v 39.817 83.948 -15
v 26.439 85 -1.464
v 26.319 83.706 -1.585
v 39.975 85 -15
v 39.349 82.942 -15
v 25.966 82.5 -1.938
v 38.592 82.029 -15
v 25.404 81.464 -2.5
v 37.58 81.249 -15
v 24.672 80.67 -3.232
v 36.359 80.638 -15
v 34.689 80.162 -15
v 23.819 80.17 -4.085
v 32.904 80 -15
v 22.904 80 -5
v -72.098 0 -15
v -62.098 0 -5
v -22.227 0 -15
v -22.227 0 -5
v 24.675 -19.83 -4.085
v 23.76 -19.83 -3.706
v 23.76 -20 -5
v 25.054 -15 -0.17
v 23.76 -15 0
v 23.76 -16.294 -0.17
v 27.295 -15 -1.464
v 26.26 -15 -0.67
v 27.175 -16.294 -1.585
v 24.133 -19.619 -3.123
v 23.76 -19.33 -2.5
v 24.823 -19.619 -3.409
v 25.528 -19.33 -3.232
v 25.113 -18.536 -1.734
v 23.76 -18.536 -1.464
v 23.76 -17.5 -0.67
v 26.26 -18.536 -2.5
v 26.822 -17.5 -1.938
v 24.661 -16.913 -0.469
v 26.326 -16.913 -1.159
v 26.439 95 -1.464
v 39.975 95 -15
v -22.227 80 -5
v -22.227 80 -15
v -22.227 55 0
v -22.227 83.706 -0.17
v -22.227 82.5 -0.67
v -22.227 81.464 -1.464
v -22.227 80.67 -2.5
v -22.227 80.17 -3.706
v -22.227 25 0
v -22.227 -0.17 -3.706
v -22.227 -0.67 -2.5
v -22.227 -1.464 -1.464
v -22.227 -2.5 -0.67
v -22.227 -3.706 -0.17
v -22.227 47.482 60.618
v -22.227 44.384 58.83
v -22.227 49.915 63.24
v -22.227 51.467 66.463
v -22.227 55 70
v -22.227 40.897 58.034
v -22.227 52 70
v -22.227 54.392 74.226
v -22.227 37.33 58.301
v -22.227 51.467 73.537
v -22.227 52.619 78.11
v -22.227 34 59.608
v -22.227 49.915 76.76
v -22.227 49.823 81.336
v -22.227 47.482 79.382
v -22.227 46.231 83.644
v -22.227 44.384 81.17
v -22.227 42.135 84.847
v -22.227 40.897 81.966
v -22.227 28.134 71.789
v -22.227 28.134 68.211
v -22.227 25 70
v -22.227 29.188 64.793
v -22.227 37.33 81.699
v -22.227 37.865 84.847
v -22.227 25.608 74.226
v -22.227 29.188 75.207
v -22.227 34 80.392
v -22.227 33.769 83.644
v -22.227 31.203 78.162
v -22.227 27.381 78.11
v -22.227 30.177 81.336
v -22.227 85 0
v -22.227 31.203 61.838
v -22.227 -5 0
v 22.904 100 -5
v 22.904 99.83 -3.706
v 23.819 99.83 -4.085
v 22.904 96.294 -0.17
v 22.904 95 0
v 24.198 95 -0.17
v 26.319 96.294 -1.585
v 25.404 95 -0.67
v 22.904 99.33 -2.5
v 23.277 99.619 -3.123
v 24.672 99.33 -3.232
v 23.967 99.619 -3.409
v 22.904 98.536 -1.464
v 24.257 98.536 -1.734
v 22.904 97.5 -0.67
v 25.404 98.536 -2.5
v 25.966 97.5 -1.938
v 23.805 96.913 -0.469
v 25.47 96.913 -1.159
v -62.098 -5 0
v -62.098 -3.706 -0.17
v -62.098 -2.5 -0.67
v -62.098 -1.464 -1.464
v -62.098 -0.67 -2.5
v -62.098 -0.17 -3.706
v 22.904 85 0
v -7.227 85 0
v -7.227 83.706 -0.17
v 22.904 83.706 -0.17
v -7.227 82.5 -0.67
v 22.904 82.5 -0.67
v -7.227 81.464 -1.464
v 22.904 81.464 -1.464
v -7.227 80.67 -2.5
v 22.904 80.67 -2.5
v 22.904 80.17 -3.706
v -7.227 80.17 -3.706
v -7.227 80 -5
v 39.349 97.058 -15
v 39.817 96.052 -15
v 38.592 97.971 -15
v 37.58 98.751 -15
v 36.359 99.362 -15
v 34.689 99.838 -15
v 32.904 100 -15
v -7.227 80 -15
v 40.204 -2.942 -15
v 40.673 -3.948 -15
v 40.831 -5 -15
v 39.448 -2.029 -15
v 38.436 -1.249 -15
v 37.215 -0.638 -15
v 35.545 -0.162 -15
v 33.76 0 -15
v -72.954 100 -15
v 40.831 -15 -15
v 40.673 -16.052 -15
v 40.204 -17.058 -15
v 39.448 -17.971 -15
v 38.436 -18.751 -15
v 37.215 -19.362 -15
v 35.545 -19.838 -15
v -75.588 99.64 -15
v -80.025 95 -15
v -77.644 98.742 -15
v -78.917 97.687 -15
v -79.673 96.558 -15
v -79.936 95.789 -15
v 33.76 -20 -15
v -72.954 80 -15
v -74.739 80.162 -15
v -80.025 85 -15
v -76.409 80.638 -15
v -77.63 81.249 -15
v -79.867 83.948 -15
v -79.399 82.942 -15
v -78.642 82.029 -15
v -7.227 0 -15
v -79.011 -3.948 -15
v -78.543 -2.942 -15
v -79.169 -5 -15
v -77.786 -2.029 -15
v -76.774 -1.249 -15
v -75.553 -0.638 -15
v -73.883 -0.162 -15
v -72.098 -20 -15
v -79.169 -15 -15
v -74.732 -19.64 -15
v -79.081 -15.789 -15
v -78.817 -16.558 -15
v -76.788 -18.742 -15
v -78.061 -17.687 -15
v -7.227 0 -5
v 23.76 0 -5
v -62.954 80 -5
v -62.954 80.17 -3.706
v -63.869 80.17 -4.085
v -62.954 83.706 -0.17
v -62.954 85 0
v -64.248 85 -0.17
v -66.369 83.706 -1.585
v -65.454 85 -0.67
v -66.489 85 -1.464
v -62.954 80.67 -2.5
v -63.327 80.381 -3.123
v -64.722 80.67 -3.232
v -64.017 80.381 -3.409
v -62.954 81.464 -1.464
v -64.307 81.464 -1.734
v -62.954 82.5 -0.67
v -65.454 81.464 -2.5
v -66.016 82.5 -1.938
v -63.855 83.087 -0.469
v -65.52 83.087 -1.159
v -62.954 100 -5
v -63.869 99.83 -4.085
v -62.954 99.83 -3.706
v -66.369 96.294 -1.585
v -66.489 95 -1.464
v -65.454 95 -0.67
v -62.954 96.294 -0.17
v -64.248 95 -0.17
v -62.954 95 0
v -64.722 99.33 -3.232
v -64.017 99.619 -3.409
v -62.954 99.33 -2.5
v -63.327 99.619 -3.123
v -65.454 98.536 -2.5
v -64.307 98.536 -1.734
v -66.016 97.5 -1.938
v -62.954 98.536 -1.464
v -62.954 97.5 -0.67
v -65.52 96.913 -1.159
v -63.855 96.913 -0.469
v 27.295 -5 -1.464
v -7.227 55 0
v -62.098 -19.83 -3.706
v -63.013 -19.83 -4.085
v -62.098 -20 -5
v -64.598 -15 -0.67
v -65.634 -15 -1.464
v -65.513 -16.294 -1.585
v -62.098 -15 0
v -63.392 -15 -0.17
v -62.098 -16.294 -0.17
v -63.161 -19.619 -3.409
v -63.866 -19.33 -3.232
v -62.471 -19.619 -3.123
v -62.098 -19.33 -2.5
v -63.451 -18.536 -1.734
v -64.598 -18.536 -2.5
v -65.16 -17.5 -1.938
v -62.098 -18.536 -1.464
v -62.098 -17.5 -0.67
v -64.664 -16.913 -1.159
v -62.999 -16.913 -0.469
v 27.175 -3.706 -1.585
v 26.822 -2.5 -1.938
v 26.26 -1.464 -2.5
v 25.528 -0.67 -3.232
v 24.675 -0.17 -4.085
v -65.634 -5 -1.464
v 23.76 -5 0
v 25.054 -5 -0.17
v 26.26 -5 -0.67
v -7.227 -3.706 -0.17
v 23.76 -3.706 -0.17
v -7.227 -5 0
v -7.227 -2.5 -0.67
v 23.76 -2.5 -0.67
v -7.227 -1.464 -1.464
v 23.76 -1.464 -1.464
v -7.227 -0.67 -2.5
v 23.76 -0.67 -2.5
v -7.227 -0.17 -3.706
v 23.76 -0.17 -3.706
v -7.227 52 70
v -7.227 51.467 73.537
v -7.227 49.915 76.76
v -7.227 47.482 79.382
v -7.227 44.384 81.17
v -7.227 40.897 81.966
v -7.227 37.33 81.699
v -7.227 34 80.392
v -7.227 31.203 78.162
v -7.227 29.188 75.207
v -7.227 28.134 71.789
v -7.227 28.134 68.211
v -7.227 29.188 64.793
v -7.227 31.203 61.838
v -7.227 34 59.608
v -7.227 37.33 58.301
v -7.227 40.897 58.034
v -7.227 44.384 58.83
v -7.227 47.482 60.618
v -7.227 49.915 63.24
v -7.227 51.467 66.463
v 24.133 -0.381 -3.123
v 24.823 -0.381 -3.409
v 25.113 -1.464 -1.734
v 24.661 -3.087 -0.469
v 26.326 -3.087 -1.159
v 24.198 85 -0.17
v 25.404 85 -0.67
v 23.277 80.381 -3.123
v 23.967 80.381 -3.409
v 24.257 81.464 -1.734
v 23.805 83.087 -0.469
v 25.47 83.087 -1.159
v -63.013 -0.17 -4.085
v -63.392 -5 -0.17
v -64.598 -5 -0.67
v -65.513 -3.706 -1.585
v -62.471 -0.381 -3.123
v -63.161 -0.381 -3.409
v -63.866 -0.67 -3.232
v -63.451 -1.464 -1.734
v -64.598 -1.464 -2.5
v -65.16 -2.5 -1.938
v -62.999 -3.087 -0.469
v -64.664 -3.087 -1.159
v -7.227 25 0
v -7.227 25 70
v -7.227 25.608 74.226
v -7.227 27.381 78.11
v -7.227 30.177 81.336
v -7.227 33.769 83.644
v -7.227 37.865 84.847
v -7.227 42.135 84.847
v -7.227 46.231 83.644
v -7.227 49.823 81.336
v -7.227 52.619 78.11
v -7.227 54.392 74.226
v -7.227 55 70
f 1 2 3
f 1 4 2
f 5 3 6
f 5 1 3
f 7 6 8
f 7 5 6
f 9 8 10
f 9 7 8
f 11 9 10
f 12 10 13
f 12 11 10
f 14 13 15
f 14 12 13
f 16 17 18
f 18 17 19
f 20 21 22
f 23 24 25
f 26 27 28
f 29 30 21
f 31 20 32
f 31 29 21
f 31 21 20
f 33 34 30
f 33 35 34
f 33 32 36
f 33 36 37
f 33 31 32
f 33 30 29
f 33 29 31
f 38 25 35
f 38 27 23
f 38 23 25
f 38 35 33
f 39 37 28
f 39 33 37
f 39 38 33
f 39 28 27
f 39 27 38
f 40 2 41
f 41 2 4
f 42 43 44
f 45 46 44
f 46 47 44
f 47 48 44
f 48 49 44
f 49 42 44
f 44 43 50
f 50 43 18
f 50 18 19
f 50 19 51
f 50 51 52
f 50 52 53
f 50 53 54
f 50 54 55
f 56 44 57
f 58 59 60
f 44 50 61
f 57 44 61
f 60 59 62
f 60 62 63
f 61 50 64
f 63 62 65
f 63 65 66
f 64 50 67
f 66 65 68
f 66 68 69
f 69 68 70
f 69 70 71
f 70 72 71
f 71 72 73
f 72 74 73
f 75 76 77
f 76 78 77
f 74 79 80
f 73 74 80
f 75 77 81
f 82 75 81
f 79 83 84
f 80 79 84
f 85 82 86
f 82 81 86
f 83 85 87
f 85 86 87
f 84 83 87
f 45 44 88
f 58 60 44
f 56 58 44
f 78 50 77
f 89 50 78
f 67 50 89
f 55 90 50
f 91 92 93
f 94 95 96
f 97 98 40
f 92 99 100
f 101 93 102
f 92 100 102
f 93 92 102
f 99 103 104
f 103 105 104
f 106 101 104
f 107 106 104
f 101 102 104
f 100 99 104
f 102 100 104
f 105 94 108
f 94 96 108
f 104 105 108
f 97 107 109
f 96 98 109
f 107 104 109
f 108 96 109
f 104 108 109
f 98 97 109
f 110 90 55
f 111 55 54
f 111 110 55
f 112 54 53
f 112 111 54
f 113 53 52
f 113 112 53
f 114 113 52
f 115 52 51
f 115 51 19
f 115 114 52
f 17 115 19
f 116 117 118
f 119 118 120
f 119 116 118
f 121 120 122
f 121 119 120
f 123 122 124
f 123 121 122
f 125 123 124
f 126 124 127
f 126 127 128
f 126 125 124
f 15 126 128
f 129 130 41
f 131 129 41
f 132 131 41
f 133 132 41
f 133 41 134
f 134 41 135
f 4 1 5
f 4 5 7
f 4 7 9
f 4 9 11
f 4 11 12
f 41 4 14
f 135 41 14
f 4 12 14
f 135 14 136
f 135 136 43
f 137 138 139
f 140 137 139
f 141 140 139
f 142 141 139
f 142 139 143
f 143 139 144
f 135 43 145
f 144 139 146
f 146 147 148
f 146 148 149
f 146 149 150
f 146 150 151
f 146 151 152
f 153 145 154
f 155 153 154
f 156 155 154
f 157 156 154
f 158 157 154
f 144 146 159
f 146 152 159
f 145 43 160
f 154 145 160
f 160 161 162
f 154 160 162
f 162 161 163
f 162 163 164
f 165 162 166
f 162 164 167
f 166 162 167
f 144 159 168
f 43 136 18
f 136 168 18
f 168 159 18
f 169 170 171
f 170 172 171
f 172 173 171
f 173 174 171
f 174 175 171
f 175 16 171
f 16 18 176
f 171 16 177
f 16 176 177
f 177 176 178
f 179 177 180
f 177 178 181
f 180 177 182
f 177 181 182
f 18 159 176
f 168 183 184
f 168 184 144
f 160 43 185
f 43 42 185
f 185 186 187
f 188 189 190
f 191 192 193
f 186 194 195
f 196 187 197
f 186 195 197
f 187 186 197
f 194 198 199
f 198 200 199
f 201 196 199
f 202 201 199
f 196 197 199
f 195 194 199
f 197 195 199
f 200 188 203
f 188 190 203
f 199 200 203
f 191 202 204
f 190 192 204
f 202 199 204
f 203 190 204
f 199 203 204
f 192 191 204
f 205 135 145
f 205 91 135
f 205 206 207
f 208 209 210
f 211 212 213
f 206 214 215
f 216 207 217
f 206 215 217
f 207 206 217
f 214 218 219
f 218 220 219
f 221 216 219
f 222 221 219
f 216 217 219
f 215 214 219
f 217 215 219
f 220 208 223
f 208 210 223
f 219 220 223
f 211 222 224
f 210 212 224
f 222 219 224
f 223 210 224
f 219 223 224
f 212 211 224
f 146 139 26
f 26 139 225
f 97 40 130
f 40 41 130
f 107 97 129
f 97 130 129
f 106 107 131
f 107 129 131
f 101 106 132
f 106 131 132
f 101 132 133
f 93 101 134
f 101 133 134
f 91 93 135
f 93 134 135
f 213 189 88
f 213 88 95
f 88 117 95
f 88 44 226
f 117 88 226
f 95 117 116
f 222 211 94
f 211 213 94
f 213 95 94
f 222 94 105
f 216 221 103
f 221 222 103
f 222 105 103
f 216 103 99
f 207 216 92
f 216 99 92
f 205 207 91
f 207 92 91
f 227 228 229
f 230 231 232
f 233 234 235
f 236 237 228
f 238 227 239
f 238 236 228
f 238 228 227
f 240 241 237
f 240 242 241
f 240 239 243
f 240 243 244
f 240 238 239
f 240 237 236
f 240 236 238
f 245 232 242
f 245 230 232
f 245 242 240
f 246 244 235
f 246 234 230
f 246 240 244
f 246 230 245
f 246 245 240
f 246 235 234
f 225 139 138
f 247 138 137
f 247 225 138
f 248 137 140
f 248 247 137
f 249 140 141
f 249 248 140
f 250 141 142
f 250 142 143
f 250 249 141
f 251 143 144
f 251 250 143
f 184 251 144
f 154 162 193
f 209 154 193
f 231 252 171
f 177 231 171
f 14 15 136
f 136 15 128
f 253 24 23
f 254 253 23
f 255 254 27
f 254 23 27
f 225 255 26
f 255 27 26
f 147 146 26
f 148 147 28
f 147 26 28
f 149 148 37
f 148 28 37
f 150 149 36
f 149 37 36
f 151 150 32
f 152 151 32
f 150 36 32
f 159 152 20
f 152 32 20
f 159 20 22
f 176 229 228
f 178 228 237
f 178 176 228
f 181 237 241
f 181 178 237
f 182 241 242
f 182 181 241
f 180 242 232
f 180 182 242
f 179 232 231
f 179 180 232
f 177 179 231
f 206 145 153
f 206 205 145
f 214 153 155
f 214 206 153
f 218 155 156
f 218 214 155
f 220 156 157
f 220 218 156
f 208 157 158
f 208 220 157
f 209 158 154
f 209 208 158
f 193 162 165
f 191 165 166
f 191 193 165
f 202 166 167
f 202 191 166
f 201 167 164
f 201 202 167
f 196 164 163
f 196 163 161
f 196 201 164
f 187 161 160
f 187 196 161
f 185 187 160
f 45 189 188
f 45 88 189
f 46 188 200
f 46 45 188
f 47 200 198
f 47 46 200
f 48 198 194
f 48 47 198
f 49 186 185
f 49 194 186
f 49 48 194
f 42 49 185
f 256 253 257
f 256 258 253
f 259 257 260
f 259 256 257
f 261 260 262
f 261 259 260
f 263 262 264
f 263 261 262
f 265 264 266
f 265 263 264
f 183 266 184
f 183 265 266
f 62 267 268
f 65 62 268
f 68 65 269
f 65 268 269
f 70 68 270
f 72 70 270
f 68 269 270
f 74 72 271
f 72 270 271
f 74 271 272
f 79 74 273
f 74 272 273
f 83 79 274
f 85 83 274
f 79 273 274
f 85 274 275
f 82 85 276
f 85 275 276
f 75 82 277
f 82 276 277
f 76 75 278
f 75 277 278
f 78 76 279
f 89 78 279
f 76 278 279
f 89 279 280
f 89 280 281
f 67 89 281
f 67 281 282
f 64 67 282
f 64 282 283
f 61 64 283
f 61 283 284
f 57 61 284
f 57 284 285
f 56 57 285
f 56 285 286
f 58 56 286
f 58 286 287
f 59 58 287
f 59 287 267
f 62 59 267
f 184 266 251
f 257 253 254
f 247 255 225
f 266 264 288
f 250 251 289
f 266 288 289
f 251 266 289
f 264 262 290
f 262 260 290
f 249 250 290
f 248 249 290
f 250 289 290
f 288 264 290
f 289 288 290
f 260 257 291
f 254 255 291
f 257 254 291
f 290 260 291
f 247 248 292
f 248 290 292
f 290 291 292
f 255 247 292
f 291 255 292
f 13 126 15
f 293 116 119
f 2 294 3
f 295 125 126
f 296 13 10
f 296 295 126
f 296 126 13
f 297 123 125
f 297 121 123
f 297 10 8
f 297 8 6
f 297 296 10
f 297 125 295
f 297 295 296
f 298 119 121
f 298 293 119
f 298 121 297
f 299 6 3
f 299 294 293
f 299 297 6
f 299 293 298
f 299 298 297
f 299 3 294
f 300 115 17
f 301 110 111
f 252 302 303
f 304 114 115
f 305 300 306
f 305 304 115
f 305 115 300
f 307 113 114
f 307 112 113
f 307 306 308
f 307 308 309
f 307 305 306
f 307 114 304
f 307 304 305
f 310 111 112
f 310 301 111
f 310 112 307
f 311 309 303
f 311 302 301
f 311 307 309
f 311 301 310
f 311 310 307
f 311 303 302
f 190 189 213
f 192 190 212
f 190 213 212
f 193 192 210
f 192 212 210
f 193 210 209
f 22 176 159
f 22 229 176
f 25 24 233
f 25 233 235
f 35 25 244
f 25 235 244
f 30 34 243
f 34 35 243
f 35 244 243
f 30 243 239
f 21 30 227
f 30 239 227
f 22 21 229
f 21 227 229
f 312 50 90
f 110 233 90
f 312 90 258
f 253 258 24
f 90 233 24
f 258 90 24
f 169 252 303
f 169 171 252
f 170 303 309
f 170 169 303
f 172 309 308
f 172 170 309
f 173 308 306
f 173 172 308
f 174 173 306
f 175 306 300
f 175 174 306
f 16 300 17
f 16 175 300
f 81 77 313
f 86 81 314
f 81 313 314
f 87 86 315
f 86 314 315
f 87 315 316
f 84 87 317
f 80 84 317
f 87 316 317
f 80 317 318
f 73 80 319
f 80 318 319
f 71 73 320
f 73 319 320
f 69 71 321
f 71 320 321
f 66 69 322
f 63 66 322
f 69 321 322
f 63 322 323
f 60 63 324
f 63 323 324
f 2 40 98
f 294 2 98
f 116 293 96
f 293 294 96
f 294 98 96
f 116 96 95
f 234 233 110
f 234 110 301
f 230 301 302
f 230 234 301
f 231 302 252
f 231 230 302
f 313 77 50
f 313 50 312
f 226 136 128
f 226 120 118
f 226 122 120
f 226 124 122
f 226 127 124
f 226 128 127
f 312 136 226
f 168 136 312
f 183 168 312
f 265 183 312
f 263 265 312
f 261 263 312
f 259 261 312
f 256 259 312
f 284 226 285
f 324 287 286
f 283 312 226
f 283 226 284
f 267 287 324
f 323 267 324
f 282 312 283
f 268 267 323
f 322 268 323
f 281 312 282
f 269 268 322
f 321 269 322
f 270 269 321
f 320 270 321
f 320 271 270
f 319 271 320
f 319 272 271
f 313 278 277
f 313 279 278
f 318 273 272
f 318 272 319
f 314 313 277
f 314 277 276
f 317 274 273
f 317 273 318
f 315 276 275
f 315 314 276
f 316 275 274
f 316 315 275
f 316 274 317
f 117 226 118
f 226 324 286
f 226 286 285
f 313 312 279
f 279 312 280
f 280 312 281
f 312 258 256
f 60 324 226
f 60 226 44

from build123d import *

# Parameters (mm, degrees)
F1_DEPTH  = 20
F2_W      = 15
F2_H      = 15
F3_DEPTH  = 80
F4_W      = 15
F4_H      = 15
F5_DEPTH  = 20
F6_R      = 5
F8_DEPTH  = 85
F10_DEPTH = 25
F11_R     = 12
F12_DEPTH = 72.7991883287


with BuildPart() as f1:
    # F0 (on Front) → F1 (new body)
    with BuildSketch(Plane.XZ):
        Polygon((-19.1690939665, 0), (-49.1690939665, 0), (-64.1690939665, 0), (-79.1690939665, -15), (-49.1690939665, -15), (10.8309060335, -15), (40.8309060335, -15), (25.8309060335, 0), (10.8309060335, 0), align=None)
    extrude(amount=F1_DEPTH)

    # F2 (on face) → F3 (join)
    with BuildSketch(Plane(origin=(0, 0, 0), x_dir=(-1, 0, 0), z_dir=(0, 1, 0))):
        with Locations((14.7267927229, -7.5)):
            Rectangle(F2_W, F2_H)
    extrude(amount=F3_DEPTH)

    # F4 (on face) → F5 (join)
    with BuildSketch(Plane(origin=(0, 80, 0), x_dir=(-1, 0, 0), z_dir=(0, 1, 0))):
        Polygon((7.2267927229, 0), (-24.975023807, 0), (-39.9750189483, -15), (-19.9750189483, -15), (7.2267927229, -15), align=None)
        with Locations((14.7267927229, -7.5)):
            Rectangle(F4_W, F4_H)
        Polygon((65.0249859104, 0), (22.2267927229, 0), (22.2267927229, -15), (60.0249810517, -15), (80.0249810517, -15), align=None)
    extrude(amount=F5_DEPTH)

    # F6
    f6_edges = [f1.edges().sort_by_distance(p)[0] for p in [
        (-65.024986, 90, 0),
        (24.975024, 90, 0),
        (-64.169094, -10, 0),
        (25.830906, -10, 0),
        (-43.197943, 0, 0),
        (9.302057, 0, 0),
        (33.330906, 0, -7.5),
        (-71.669094, 0, -7.5),
        (-71.669094, -20, -7.5),
        (-19.169094, -20, 0),
        (33.330906, -20, -7.5),
        (8.874116, 80, 0),
        (-43.625889, 80, 0),
        (-72.524983, 80, -7.5),
        (-72.524983, 100, -7.5),
        (-20.024981, 100, 0),
        (32.475021, 100, -7.5),
        (32.475021, 80, -7.5),
    ]]
    fillet(f6_edges, radius=F6_R)

    # F7 (on face) → F8 (join)
    with BuildSketch(Plane.XY):
        Polygon((-22.2267927229, 25), (-7.2267927229, 25), (-7.2267927229, 55), (-22.2267927229, 55), (-22.2267927229, 40), align=None)
    extrude(amount=F8_DEPTH)

    # F9 (on face) → F10 (cut)
    with BuildSketch(Plane.YZ.offset(-7.2267927229)):
        with BuildLine():
            ThreePointArc((25, 70), (29.3933982822, 80.6066017178), (40, 85))
            Line((40, 85), (25, 85))
            Line((25, 85), (25, 70))
        make_face()
        with BuildLine():
            Line((55, 85), (40, 85))
            ThreePointArc((40, 85), (50.6066017178, 80.6066017178), (55, 70))
            Line((55, 70), (55, 85))
        make_face()
    extrude(amount=-F10_DEPTH, mode=Mode.SUBTRACT)

    # F11 (on face) → F12 (cut, through all)
    with BuildSketch(Plane.YZ.offset(-7.2267927229)):
        with Locations((40, 70)):
            Circle(F11_R)
    extrude(amount=-F12_DEPTH, mode=Mode.SUBTRACT)


solid = f1.part
